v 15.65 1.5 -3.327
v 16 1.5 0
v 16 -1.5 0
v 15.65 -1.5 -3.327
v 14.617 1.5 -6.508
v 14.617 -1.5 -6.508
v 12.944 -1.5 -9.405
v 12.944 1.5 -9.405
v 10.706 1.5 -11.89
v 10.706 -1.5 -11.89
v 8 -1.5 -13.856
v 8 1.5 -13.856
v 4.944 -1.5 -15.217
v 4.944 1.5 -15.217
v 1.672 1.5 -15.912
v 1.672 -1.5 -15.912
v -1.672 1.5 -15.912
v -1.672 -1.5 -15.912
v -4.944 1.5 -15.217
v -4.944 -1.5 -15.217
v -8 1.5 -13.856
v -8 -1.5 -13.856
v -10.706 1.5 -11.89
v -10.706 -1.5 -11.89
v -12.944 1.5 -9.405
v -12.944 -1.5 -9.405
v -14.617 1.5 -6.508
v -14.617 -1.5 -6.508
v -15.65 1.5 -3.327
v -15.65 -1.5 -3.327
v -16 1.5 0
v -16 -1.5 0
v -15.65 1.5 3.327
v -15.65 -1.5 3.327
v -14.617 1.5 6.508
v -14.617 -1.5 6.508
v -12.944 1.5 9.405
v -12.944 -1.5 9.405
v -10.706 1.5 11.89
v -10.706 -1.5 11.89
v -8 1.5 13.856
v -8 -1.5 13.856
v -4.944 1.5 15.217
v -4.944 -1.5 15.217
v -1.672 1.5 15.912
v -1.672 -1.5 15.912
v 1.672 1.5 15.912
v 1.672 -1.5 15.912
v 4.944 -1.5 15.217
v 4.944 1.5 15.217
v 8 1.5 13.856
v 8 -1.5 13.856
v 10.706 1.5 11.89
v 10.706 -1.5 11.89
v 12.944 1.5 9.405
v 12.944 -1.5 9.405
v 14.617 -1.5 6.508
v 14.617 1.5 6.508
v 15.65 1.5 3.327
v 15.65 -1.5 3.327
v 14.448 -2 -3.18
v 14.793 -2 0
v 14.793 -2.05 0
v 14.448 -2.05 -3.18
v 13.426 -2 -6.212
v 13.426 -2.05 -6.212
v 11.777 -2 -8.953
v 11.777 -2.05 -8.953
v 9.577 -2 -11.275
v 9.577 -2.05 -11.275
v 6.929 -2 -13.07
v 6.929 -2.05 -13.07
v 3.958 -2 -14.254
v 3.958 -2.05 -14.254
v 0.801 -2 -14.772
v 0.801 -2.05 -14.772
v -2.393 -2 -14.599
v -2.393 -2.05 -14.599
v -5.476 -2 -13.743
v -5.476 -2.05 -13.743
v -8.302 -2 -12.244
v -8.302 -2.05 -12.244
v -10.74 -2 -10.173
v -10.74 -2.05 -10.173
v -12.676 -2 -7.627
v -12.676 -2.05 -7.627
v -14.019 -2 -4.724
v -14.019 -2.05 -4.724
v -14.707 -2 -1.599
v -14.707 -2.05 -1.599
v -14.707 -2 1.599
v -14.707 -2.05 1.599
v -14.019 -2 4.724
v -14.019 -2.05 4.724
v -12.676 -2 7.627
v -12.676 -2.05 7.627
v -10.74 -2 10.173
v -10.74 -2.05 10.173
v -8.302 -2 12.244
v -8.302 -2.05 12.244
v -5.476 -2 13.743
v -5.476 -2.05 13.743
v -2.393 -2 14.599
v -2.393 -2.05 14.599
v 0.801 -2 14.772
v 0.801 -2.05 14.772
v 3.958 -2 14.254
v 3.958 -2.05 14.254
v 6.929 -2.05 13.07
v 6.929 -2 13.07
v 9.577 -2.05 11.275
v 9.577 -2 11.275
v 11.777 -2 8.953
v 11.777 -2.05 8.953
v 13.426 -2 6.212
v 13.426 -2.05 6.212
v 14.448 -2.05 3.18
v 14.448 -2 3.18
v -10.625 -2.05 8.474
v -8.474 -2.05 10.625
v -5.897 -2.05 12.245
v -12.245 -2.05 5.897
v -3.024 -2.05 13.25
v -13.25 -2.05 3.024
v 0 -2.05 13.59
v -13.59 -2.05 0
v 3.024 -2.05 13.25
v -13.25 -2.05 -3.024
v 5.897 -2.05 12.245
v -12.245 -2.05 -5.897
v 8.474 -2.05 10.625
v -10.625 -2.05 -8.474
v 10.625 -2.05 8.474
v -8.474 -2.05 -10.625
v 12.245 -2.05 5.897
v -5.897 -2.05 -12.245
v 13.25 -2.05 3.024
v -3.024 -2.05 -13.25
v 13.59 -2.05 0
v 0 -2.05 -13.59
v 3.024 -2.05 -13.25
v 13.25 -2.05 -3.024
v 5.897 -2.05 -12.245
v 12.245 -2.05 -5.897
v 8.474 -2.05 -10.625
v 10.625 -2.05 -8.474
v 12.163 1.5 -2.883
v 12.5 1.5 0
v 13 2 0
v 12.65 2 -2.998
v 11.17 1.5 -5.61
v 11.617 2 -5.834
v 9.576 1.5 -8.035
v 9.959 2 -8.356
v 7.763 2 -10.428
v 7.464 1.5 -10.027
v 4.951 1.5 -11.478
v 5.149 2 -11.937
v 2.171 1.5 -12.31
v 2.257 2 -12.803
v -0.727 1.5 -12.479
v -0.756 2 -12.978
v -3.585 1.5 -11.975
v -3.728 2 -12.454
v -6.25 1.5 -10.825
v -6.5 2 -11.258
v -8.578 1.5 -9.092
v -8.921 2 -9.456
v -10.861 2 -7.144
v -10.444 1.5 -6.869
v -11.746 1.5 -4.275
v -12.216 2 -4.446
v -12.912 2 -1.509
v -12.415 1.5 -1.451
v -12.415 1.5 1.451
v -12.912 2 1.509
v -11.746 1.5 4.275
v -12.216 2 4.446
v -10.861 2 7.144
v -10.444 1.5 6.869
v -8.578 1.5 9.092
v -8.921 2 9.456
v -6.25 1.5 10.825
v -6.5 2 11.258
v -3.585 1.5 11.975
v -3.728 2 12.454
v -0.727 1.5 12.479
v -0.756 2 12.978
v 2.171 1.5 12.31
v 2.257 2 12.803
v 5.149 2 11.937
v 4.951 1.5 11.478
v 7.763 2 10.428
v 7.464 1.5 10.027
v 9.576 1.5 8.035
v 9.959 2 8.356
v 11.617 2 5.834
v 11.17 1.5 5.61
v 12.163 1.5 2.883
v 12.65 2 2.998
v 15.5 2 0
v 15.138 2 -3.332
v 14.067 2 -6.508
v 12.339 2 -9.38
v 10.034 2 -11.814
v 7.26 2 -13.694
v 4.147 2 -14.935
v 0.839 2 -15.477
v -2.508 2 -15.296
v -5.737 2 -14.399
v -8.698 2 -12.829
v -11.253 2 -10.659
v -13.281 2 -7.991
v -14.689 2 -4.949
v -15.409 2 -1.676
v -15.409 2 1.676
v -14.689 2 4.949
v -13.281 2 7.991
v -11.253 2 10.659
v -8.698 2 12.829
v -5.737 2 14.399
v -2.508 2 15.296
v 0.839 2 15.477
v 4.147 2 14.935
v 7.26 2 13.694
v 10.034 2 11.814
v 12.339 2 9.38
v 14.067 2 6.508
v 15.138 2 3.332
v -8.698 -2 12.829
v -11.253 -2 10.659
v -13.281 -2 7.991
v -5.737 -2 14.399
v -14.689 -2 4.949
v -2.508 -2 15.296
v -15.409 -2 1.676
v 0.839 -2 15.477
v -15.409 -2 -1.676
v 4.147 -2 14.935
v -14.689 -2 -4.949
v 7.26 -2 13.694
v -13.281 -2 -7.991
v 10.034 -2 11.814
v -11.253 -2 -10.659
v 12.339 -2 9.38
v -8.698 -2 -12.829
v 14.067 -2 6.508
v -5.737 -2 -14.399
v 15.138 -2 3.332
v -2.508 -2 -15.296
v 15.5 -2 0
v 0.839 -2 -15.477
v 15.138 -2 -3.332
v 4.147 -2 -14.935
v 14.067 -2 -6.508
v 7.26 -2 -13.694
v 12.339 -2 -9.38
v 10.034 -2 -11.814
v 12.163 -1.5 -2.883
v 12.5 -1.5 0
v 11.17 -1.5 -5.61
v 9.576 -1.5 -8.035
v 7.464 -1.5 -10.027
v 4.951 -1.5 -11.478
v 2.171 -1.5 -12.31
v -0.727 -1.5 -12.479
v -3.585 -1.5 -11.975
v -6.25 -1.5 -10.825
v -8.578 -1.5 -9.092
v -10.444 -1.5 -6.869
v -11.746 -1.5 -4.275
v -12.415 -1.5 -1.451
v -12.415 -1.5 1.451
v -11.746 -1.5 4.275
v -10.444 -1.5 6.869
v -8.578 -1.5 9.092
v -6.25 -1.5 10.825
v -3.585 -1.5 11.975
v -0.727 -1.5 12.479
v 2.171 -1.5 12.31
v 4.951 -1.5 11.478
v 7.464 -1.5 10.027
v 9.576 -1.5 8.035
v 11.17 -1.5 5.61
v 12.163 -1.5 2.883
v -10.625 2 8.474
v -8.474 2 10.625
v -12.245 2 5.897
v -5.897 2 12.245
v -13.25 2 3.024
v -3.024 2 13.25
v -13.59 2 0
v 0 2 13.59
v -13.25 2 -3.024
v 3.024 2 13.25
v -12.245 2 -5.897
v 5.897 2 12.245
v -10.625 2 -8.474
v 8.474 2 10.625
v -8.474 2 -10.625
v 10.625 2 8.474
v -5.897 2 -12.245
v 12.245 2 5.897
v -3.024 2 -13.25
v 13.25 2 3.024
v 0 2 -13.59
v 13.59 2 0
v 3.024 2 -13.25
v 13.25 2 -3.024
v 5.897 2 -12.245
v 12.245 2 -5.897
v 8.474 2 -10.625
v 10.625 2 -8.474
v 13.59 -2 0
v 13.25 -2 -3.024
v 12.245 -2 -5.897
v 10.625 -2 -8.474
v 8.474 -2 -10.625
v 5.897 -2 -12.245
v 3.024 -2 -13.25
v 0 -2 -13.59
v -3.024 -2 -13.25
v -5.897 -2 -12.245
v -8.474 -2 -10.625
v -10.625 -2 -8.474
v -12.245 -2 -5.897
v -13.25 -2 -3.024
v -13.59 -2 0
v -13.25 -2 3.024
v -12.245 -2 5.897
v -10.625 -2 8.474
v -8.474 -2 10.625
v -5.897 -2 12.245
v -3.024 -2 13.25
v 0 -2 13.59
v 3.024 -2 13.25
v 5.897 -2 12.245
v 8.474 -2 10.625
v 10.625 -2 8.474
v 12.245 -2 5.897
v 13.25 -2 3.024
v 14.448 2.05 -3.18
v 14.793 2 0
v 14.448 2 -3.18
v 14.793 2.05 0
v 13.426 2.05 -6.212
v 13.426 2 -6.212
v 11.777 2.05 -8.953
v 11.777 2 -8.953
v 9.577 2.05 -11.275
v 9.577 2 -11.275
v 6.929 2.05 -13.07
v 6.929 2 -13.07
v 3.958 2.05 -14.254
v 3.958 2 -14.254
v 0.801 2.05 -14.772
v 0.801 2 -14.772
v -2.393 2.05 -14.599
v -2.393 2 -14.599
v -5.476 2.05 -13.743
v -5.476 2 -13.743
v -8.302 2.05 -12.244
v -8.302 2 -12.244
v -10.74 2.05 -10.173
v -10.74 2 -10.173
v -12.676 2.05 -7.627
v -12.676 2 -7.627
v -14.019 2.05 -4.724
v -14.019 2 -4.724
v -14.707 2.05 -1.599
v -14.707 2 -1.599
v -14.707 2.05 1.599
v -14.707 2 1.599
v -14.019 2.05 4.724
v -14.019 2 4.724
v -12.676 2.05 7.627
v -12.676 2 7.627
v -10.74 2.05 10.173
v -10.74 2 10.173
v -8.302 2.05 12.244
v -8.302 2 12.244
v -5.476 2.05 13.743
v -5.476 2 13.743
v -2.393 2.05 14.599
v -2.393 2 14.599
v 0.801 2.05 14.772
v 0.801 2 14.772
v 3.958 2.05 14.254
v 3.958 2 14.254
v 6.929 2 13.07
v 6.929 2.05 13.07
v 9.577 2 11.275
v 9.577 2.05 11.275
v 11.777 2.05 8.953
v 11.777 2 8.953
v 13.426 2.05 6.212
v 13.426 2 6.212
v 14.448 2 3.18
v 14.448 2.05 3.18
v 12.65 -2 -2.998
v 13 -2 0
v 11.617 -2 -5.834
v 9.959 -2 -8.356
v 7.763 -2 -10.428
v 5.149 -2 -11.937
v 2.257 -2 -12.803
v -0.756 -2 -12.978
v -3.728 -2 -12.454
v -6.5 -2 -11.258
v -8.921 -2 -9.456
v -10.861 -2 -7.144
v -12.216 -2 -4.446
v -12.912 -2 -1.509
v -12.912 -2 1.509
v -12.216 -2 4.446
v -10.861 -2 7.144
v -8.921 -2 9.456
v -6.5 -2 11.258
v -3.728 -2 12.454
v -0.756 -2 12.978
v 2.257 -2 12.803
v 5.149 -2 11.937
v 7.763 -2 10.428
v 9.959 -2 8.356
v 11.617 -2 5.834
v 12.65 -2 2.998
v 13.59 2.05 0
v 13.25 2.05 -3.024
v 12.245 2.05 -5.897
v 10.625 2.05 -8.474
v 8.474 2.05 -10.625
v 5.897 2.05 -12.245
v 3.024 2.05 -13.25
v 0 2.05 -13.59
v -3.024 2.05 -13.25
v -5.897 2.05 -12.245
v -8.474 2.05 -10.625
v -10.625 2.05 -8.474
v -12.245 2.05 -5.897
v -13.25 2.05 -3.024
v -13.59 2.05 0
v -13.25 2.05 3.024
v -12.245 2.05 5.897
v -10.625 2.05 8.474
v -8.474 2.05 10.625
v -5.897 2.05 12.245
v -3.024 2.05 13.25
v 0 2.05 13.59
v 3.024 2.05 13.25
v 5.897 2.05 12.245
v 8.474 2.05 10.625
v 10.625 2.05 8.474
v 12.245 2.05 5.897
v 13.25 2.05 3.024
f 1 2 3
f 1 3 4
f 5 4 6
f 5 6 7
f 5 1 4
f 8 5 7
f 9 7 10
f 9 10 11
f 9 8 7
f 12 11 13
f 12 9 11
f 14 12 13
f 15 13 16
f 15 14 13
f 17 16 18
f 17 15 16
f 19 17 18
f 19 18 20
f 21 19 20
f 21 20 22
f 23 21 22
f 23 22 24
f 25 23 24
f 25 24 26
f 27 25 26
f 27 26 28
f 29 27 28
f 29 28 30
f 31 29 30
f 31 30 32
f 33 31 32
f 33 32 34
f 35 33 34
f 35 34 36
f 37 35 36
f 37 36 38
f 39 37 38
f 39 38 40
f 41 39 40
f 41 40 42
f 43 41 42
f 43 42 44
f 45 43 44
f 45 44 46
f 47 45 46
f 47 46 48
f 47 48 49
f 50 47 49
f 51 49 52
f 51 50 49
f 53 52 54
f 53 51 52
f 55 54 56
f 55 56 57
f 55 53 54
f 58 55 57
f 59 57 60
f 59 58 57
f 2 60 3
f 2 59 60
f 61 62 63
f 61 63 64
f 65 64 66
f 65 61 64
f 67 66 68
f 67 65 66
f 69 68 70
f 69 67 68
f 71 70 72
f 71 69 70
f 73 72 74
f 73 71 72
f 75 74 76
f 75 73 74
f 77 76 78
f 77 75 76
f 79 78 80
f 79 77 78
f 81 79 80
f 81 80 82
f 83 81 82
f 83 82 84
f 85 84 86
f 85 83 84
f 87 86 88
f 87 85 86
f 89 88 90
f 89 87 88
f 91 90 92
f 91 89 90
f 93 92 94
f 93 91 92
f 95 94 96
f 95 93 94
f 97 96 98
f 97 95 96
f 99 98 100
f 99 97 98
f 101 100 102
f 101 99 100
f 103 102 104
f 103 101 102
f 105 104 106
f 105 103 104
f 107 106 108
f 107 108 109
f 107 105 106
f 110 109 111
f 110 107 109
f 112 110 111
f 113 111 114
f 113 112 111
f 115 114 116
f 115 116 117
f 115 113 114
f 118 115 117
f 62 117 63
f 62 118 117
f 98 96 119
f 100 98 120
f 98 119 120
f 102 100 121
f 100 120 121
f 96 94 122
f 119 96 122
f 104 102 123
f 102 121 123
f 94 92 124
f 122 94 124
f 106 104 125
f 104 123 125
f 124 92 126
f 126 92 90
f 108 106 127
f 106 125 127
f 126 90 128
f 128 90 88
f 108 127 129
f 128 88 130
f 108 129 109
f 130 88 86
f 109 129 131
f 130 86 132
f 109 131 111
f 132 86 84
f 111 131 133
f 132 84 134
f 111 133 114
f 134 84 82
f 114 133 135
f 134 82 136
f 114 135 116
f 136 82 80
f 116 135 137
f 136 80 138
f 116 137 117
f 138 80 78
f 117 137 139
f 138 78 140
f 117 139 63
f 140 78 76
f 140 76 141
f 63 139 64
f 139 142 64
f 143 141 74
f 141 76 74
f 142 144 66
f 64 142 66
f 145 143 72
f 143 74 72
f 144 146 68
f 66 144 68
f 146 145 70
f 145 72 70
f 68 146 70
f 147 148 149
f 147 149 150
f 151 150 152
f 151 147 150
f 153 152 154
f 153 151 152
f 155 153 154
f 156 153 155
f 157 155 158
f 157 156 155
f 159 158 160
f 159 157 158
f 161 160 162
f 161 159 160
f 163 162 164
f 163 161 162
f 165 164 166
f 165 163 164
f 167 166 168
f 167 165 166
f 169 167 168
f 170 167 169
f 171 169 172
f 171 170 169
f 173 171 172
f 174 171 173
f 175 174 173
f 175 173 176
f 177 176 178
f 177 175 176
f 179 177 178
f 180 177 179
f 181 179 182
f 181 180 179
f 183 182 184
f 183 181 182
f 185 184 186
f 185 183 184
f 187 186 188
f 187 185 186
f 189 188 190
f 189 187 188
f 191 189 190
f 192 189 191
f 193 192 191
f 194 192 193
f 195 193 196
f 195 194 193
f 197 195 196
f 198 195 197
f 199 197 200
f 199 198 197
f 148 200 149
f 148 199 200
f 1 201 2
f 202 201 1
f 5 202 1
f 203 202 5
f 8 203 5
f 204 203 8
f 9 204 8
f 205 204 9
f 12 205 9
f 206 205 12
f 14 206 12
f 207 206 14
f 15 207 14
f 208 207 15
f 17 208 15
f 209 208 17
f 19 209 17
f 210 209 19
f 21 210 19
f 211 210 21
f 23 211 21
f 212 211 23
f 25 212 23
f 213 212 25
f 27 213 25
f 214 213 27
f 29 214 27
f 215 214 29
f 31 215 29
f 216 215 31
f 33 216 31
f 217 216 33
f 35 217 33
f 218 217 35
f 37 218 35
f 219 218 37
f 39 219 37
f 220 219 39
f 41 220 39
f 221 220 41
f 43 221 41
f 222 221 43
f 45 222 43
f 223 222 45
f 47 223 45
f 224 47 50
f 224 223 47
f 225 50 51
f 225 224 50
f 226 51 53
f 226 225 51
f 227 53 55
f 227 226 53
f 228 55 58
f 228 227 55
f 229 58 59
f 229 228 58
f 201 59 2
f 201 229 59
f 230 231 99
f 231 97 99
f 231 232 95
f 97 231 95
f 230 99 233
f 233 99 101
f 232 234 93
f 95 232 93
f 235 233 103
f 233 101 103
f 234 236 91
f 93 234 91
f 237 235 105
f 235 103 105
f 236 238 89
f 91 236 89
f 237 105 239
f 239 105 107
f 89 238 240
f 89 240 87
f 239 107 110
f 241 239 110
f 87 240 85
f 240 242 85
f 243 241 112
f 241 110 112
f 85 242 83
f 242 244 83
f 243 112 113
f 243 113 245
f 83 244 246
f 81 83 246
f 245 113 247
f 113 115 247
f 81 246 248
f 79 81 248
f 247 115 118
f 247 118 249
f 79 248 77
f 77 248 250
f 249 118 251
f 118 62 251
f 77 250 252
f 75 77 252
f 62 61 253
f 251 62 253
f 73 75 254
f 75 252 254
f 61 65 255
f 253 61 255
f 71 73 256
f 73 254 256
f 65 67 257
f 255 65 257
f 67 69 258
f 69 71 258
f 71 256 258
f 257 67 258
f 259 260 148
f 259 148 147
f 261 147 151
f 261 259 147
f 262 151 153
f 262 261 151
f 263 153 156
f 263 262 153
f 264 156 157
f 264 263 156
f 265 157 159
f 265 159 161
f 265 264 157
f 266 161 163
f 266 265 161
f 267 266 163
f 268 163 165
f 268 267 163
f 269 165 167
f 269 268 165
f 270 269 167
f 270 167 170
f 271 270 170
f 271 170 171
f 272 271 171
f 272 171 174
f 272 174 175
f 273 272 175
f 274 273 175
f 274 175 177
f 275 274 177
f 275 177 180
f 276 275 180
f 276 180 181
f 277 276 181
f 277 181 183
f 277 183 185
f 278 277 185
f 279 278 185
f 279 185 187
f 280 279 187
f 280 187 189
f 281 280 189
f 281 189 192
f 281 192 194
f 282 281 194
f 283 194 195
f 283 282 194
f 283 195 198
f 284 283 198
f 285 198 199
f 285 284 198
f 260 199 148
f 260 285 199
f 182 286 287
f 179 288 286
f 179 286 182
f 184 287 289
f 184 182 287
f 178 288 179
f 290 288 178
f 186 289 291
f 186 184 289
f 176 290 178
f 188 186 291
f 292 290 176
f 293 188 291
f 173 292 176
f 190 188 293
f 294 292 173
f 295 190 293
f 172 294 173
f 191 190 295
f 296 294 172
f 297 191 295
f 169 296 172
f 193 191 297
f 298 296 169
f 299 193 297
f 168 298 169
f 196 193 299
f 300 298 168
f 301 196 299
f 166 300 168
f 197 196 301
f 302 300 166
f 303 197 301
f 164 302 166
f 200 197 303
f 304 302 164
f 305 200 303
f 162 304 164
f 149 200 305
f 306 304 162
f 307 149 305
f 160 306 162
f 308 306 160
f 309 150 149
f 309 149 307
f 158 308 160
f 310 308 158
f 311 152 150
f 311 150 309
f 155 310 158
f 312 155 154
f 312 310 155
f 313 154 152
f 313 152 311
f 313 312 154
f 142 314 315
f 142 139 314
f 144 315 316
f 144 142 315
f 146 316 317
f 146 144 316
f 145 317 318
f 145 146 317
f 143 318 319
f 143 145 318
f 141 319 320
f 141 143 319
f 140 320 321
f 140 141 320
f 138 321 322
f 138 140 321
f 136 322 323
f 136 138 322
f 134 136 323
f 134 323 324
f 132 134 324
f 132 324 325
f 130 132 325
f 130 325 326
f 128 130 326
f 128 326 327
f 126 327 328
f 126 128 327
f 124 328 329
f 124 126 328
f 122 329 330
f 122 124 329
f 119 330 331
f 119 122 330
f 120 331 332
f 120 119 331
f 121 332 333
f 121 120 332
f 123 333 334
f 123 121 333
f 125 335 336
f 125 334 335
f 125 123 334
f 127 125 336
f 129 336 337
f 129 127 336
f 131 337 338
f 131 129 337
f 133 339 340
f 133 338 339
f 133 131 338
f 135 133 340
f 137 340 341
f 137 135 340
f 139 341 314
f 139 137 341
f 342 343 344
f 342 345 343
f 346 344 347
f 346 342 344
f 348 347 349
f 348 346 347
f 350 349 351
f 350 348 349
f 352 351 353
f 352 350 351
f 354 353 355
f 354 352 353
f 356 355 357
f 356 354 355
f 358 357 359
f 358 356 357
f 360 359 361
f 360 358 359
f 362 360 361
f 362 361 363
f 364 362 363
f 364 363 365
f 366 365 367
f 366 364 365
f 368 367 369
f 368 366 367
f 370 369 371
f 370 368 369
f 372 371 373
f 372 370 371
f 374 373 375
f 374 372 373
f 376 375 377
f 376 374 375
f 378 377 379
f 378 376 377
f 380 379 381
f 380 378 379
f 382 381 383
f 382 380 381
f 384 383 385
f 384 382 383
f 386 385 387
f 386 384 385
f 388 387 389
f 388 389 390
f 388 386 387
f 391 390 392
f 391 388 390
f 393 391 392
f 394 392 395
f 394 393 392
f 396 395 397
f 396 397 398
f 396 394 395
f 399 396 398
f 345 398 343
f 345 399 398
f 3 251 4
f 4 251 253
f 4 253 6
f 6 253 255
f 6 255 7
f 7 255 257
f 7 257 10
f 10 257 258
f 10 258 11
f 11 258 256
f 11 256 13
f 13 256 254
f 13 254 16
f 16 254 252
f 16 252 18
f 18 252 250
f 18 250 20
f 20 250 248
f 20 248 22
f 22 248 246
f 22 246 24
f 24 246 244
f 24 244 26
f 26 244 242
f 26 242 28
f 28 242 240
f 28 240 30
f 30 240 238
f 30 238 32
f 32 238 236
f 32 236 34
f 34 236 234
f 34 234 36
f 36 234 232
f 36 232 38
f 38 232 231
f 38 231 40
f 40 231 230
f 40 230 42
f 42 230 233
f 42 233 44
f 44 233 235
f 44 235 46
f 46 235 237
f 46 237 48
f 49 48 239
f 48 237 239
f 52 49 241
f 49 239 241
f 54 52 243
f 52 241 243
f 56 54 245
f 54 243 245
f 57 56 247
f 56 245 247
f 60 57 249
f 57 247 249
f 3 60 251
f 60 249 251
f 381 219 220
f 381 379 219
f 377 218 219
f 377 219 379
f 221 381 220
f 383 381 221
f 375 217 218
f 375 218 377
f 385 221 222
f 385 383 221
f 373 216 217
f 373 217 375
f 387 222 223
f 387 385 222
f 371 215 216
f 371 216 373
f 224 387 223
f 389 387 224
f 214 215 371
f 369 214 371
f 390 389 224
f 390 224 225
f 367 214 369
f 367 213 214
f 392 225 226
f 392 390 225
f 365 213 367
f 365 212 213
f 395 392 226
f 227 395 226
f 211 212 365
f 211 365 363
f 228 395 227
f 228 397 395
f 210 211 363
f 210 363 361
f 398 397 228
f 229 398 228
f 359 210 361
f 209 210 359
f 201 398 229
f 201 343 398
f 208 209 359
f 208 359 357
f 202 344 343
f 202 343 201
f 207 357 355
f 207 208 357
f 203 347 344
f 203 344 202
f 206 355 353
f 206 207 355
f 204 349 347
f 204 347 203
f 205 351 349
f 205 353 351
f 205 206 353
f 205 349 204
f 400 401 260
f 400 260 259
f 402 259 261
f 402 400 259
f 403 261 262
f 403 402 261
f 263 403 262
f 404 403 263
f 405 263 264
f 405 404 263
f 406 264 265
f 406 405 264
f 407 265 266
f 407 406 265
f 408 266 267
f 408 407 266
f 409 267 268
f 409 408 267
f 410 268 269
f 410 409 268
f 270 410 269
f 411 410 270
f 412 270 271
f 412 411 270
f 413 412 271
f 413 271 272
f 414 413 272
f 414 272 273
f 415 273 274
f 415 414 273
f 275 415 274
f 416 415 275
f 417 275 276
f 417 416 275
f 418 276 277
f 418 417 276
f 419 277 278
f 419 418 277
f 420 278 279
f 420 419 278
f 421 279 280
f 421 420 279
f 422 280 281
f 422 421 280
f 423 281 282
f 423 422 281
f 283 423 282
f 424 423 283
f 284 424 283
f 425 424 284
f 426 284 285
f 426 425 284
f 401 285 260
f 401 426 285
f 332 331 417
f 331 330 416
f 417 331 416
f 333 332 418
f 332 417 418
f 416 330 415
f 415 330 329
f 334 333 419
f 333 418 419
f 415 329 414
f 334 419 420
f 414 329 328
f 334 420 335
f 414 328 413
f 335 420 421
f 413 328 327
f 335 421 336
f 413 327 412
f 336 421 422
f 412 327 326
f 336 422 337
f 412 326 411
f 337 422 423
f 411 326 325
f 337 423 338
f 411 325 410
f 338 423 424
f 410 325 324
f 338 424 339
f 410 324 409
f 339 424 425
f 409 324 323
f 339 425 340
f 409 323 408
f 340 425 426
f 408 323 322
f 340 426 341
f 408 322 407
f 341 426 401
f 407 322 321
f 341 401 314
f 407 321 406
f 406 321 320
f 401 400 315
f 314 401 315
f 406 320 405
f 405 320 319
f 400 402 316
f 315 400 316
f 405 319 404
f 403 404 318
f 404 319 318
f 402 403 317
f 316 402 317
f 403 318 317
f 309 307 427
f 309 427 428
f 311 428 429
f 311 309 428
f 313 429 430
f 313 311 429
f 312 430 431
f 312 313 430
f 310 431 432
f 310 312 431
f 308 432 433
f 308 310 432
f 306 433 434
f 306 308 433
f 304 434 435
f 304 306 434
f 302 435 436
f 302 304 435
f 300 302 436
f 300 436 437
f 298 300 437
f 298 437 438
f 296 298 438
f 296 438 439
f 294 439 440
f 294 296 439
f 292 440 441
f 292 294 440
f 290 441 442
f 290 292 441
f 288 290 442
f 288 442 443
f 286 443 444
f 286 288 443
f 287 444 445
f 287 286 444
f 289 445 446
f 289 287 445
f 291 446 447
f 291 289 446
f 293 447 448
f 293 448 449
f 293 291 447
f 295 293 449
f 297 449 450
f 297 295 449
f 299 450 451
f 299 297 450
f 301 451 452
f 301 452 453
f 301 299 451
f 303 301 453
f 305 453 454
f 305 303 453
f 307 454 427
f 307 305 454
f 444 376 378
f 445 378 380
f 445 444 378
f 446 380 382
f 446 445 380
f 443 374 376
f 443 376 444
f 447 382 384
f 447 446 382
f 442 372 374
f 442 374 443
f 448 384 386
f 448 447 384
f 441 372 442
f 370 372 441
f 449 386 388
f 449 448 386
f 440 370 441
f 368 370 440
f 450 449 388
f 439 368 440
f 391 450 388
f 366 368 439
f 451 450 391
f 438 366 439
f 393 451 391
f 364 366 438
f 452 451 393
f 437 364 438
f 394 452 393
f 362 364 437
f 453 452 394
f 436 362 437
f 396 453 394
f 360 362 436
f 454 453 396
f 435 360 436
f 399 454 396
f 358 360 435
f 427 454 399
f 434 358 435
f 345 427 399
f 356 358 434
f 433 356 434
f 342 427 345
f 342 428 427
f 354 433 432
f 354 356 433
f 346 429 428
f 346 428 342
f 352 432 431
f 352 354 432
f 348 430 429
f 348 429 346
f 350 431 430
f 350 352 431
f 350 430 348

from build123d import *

# Parameters (mm, degrees)
CROQUIS1_R              = 16
CROQUIS1_R_2            = 12.5
SALIENTE_EXTRUIR1_DEPTH = 2
CHAFL_N1_SIZE           = 0.5
CROQUIS2_R              = 14.793460403
CROQUIS2_R_2            = 13.590473759
SALIENTE_EXTRUIR2_DEPTH = 2.05


with BuildPart() as part:
    # Croquis1 → Saliente-Extruir1 (new body, symmetric)
    with BuildSketch(Plane(origin=(0, 0, 0), x_dir=(1, 0, 0), z_dir=(0, 1, 0))):
        Circle(CROQUIS1_R)
        Circle(CROQUIS1_R_2, mode=Mode.SUBTRACT)
    extrude(amount=SALIENTE_EXTRUIR1_DEPTH, both=True)

    # Chaflán1
    chafl_n1_edges = [part.edges().sort_by_distance(p)[0] for p in [
        (-16, -2, 0),
        (-16, 2, 0),
        (-12.5, -2, 0),
        (-12.5, 2, 0),
    ]]
    chamfer(chafl_n1_edges, length=CHAFL_N1_SIZE)

    # Croquis2 → Saliente-Extruir2 (add, symmetric)
    with BuildSketch(Plane(origin=(0, 0, 0), x_dir=(1, 0, 0), z_dir=(0, 1, 0))):
        Circle(CROQUIS2_R)
        Circle(CROQUIS2_R_2, mode=Mode.SUBTRACT)
    extrude(amount=SALIENTE_EXTRUIR2_DEPTH, both=True)


solid = part.part
